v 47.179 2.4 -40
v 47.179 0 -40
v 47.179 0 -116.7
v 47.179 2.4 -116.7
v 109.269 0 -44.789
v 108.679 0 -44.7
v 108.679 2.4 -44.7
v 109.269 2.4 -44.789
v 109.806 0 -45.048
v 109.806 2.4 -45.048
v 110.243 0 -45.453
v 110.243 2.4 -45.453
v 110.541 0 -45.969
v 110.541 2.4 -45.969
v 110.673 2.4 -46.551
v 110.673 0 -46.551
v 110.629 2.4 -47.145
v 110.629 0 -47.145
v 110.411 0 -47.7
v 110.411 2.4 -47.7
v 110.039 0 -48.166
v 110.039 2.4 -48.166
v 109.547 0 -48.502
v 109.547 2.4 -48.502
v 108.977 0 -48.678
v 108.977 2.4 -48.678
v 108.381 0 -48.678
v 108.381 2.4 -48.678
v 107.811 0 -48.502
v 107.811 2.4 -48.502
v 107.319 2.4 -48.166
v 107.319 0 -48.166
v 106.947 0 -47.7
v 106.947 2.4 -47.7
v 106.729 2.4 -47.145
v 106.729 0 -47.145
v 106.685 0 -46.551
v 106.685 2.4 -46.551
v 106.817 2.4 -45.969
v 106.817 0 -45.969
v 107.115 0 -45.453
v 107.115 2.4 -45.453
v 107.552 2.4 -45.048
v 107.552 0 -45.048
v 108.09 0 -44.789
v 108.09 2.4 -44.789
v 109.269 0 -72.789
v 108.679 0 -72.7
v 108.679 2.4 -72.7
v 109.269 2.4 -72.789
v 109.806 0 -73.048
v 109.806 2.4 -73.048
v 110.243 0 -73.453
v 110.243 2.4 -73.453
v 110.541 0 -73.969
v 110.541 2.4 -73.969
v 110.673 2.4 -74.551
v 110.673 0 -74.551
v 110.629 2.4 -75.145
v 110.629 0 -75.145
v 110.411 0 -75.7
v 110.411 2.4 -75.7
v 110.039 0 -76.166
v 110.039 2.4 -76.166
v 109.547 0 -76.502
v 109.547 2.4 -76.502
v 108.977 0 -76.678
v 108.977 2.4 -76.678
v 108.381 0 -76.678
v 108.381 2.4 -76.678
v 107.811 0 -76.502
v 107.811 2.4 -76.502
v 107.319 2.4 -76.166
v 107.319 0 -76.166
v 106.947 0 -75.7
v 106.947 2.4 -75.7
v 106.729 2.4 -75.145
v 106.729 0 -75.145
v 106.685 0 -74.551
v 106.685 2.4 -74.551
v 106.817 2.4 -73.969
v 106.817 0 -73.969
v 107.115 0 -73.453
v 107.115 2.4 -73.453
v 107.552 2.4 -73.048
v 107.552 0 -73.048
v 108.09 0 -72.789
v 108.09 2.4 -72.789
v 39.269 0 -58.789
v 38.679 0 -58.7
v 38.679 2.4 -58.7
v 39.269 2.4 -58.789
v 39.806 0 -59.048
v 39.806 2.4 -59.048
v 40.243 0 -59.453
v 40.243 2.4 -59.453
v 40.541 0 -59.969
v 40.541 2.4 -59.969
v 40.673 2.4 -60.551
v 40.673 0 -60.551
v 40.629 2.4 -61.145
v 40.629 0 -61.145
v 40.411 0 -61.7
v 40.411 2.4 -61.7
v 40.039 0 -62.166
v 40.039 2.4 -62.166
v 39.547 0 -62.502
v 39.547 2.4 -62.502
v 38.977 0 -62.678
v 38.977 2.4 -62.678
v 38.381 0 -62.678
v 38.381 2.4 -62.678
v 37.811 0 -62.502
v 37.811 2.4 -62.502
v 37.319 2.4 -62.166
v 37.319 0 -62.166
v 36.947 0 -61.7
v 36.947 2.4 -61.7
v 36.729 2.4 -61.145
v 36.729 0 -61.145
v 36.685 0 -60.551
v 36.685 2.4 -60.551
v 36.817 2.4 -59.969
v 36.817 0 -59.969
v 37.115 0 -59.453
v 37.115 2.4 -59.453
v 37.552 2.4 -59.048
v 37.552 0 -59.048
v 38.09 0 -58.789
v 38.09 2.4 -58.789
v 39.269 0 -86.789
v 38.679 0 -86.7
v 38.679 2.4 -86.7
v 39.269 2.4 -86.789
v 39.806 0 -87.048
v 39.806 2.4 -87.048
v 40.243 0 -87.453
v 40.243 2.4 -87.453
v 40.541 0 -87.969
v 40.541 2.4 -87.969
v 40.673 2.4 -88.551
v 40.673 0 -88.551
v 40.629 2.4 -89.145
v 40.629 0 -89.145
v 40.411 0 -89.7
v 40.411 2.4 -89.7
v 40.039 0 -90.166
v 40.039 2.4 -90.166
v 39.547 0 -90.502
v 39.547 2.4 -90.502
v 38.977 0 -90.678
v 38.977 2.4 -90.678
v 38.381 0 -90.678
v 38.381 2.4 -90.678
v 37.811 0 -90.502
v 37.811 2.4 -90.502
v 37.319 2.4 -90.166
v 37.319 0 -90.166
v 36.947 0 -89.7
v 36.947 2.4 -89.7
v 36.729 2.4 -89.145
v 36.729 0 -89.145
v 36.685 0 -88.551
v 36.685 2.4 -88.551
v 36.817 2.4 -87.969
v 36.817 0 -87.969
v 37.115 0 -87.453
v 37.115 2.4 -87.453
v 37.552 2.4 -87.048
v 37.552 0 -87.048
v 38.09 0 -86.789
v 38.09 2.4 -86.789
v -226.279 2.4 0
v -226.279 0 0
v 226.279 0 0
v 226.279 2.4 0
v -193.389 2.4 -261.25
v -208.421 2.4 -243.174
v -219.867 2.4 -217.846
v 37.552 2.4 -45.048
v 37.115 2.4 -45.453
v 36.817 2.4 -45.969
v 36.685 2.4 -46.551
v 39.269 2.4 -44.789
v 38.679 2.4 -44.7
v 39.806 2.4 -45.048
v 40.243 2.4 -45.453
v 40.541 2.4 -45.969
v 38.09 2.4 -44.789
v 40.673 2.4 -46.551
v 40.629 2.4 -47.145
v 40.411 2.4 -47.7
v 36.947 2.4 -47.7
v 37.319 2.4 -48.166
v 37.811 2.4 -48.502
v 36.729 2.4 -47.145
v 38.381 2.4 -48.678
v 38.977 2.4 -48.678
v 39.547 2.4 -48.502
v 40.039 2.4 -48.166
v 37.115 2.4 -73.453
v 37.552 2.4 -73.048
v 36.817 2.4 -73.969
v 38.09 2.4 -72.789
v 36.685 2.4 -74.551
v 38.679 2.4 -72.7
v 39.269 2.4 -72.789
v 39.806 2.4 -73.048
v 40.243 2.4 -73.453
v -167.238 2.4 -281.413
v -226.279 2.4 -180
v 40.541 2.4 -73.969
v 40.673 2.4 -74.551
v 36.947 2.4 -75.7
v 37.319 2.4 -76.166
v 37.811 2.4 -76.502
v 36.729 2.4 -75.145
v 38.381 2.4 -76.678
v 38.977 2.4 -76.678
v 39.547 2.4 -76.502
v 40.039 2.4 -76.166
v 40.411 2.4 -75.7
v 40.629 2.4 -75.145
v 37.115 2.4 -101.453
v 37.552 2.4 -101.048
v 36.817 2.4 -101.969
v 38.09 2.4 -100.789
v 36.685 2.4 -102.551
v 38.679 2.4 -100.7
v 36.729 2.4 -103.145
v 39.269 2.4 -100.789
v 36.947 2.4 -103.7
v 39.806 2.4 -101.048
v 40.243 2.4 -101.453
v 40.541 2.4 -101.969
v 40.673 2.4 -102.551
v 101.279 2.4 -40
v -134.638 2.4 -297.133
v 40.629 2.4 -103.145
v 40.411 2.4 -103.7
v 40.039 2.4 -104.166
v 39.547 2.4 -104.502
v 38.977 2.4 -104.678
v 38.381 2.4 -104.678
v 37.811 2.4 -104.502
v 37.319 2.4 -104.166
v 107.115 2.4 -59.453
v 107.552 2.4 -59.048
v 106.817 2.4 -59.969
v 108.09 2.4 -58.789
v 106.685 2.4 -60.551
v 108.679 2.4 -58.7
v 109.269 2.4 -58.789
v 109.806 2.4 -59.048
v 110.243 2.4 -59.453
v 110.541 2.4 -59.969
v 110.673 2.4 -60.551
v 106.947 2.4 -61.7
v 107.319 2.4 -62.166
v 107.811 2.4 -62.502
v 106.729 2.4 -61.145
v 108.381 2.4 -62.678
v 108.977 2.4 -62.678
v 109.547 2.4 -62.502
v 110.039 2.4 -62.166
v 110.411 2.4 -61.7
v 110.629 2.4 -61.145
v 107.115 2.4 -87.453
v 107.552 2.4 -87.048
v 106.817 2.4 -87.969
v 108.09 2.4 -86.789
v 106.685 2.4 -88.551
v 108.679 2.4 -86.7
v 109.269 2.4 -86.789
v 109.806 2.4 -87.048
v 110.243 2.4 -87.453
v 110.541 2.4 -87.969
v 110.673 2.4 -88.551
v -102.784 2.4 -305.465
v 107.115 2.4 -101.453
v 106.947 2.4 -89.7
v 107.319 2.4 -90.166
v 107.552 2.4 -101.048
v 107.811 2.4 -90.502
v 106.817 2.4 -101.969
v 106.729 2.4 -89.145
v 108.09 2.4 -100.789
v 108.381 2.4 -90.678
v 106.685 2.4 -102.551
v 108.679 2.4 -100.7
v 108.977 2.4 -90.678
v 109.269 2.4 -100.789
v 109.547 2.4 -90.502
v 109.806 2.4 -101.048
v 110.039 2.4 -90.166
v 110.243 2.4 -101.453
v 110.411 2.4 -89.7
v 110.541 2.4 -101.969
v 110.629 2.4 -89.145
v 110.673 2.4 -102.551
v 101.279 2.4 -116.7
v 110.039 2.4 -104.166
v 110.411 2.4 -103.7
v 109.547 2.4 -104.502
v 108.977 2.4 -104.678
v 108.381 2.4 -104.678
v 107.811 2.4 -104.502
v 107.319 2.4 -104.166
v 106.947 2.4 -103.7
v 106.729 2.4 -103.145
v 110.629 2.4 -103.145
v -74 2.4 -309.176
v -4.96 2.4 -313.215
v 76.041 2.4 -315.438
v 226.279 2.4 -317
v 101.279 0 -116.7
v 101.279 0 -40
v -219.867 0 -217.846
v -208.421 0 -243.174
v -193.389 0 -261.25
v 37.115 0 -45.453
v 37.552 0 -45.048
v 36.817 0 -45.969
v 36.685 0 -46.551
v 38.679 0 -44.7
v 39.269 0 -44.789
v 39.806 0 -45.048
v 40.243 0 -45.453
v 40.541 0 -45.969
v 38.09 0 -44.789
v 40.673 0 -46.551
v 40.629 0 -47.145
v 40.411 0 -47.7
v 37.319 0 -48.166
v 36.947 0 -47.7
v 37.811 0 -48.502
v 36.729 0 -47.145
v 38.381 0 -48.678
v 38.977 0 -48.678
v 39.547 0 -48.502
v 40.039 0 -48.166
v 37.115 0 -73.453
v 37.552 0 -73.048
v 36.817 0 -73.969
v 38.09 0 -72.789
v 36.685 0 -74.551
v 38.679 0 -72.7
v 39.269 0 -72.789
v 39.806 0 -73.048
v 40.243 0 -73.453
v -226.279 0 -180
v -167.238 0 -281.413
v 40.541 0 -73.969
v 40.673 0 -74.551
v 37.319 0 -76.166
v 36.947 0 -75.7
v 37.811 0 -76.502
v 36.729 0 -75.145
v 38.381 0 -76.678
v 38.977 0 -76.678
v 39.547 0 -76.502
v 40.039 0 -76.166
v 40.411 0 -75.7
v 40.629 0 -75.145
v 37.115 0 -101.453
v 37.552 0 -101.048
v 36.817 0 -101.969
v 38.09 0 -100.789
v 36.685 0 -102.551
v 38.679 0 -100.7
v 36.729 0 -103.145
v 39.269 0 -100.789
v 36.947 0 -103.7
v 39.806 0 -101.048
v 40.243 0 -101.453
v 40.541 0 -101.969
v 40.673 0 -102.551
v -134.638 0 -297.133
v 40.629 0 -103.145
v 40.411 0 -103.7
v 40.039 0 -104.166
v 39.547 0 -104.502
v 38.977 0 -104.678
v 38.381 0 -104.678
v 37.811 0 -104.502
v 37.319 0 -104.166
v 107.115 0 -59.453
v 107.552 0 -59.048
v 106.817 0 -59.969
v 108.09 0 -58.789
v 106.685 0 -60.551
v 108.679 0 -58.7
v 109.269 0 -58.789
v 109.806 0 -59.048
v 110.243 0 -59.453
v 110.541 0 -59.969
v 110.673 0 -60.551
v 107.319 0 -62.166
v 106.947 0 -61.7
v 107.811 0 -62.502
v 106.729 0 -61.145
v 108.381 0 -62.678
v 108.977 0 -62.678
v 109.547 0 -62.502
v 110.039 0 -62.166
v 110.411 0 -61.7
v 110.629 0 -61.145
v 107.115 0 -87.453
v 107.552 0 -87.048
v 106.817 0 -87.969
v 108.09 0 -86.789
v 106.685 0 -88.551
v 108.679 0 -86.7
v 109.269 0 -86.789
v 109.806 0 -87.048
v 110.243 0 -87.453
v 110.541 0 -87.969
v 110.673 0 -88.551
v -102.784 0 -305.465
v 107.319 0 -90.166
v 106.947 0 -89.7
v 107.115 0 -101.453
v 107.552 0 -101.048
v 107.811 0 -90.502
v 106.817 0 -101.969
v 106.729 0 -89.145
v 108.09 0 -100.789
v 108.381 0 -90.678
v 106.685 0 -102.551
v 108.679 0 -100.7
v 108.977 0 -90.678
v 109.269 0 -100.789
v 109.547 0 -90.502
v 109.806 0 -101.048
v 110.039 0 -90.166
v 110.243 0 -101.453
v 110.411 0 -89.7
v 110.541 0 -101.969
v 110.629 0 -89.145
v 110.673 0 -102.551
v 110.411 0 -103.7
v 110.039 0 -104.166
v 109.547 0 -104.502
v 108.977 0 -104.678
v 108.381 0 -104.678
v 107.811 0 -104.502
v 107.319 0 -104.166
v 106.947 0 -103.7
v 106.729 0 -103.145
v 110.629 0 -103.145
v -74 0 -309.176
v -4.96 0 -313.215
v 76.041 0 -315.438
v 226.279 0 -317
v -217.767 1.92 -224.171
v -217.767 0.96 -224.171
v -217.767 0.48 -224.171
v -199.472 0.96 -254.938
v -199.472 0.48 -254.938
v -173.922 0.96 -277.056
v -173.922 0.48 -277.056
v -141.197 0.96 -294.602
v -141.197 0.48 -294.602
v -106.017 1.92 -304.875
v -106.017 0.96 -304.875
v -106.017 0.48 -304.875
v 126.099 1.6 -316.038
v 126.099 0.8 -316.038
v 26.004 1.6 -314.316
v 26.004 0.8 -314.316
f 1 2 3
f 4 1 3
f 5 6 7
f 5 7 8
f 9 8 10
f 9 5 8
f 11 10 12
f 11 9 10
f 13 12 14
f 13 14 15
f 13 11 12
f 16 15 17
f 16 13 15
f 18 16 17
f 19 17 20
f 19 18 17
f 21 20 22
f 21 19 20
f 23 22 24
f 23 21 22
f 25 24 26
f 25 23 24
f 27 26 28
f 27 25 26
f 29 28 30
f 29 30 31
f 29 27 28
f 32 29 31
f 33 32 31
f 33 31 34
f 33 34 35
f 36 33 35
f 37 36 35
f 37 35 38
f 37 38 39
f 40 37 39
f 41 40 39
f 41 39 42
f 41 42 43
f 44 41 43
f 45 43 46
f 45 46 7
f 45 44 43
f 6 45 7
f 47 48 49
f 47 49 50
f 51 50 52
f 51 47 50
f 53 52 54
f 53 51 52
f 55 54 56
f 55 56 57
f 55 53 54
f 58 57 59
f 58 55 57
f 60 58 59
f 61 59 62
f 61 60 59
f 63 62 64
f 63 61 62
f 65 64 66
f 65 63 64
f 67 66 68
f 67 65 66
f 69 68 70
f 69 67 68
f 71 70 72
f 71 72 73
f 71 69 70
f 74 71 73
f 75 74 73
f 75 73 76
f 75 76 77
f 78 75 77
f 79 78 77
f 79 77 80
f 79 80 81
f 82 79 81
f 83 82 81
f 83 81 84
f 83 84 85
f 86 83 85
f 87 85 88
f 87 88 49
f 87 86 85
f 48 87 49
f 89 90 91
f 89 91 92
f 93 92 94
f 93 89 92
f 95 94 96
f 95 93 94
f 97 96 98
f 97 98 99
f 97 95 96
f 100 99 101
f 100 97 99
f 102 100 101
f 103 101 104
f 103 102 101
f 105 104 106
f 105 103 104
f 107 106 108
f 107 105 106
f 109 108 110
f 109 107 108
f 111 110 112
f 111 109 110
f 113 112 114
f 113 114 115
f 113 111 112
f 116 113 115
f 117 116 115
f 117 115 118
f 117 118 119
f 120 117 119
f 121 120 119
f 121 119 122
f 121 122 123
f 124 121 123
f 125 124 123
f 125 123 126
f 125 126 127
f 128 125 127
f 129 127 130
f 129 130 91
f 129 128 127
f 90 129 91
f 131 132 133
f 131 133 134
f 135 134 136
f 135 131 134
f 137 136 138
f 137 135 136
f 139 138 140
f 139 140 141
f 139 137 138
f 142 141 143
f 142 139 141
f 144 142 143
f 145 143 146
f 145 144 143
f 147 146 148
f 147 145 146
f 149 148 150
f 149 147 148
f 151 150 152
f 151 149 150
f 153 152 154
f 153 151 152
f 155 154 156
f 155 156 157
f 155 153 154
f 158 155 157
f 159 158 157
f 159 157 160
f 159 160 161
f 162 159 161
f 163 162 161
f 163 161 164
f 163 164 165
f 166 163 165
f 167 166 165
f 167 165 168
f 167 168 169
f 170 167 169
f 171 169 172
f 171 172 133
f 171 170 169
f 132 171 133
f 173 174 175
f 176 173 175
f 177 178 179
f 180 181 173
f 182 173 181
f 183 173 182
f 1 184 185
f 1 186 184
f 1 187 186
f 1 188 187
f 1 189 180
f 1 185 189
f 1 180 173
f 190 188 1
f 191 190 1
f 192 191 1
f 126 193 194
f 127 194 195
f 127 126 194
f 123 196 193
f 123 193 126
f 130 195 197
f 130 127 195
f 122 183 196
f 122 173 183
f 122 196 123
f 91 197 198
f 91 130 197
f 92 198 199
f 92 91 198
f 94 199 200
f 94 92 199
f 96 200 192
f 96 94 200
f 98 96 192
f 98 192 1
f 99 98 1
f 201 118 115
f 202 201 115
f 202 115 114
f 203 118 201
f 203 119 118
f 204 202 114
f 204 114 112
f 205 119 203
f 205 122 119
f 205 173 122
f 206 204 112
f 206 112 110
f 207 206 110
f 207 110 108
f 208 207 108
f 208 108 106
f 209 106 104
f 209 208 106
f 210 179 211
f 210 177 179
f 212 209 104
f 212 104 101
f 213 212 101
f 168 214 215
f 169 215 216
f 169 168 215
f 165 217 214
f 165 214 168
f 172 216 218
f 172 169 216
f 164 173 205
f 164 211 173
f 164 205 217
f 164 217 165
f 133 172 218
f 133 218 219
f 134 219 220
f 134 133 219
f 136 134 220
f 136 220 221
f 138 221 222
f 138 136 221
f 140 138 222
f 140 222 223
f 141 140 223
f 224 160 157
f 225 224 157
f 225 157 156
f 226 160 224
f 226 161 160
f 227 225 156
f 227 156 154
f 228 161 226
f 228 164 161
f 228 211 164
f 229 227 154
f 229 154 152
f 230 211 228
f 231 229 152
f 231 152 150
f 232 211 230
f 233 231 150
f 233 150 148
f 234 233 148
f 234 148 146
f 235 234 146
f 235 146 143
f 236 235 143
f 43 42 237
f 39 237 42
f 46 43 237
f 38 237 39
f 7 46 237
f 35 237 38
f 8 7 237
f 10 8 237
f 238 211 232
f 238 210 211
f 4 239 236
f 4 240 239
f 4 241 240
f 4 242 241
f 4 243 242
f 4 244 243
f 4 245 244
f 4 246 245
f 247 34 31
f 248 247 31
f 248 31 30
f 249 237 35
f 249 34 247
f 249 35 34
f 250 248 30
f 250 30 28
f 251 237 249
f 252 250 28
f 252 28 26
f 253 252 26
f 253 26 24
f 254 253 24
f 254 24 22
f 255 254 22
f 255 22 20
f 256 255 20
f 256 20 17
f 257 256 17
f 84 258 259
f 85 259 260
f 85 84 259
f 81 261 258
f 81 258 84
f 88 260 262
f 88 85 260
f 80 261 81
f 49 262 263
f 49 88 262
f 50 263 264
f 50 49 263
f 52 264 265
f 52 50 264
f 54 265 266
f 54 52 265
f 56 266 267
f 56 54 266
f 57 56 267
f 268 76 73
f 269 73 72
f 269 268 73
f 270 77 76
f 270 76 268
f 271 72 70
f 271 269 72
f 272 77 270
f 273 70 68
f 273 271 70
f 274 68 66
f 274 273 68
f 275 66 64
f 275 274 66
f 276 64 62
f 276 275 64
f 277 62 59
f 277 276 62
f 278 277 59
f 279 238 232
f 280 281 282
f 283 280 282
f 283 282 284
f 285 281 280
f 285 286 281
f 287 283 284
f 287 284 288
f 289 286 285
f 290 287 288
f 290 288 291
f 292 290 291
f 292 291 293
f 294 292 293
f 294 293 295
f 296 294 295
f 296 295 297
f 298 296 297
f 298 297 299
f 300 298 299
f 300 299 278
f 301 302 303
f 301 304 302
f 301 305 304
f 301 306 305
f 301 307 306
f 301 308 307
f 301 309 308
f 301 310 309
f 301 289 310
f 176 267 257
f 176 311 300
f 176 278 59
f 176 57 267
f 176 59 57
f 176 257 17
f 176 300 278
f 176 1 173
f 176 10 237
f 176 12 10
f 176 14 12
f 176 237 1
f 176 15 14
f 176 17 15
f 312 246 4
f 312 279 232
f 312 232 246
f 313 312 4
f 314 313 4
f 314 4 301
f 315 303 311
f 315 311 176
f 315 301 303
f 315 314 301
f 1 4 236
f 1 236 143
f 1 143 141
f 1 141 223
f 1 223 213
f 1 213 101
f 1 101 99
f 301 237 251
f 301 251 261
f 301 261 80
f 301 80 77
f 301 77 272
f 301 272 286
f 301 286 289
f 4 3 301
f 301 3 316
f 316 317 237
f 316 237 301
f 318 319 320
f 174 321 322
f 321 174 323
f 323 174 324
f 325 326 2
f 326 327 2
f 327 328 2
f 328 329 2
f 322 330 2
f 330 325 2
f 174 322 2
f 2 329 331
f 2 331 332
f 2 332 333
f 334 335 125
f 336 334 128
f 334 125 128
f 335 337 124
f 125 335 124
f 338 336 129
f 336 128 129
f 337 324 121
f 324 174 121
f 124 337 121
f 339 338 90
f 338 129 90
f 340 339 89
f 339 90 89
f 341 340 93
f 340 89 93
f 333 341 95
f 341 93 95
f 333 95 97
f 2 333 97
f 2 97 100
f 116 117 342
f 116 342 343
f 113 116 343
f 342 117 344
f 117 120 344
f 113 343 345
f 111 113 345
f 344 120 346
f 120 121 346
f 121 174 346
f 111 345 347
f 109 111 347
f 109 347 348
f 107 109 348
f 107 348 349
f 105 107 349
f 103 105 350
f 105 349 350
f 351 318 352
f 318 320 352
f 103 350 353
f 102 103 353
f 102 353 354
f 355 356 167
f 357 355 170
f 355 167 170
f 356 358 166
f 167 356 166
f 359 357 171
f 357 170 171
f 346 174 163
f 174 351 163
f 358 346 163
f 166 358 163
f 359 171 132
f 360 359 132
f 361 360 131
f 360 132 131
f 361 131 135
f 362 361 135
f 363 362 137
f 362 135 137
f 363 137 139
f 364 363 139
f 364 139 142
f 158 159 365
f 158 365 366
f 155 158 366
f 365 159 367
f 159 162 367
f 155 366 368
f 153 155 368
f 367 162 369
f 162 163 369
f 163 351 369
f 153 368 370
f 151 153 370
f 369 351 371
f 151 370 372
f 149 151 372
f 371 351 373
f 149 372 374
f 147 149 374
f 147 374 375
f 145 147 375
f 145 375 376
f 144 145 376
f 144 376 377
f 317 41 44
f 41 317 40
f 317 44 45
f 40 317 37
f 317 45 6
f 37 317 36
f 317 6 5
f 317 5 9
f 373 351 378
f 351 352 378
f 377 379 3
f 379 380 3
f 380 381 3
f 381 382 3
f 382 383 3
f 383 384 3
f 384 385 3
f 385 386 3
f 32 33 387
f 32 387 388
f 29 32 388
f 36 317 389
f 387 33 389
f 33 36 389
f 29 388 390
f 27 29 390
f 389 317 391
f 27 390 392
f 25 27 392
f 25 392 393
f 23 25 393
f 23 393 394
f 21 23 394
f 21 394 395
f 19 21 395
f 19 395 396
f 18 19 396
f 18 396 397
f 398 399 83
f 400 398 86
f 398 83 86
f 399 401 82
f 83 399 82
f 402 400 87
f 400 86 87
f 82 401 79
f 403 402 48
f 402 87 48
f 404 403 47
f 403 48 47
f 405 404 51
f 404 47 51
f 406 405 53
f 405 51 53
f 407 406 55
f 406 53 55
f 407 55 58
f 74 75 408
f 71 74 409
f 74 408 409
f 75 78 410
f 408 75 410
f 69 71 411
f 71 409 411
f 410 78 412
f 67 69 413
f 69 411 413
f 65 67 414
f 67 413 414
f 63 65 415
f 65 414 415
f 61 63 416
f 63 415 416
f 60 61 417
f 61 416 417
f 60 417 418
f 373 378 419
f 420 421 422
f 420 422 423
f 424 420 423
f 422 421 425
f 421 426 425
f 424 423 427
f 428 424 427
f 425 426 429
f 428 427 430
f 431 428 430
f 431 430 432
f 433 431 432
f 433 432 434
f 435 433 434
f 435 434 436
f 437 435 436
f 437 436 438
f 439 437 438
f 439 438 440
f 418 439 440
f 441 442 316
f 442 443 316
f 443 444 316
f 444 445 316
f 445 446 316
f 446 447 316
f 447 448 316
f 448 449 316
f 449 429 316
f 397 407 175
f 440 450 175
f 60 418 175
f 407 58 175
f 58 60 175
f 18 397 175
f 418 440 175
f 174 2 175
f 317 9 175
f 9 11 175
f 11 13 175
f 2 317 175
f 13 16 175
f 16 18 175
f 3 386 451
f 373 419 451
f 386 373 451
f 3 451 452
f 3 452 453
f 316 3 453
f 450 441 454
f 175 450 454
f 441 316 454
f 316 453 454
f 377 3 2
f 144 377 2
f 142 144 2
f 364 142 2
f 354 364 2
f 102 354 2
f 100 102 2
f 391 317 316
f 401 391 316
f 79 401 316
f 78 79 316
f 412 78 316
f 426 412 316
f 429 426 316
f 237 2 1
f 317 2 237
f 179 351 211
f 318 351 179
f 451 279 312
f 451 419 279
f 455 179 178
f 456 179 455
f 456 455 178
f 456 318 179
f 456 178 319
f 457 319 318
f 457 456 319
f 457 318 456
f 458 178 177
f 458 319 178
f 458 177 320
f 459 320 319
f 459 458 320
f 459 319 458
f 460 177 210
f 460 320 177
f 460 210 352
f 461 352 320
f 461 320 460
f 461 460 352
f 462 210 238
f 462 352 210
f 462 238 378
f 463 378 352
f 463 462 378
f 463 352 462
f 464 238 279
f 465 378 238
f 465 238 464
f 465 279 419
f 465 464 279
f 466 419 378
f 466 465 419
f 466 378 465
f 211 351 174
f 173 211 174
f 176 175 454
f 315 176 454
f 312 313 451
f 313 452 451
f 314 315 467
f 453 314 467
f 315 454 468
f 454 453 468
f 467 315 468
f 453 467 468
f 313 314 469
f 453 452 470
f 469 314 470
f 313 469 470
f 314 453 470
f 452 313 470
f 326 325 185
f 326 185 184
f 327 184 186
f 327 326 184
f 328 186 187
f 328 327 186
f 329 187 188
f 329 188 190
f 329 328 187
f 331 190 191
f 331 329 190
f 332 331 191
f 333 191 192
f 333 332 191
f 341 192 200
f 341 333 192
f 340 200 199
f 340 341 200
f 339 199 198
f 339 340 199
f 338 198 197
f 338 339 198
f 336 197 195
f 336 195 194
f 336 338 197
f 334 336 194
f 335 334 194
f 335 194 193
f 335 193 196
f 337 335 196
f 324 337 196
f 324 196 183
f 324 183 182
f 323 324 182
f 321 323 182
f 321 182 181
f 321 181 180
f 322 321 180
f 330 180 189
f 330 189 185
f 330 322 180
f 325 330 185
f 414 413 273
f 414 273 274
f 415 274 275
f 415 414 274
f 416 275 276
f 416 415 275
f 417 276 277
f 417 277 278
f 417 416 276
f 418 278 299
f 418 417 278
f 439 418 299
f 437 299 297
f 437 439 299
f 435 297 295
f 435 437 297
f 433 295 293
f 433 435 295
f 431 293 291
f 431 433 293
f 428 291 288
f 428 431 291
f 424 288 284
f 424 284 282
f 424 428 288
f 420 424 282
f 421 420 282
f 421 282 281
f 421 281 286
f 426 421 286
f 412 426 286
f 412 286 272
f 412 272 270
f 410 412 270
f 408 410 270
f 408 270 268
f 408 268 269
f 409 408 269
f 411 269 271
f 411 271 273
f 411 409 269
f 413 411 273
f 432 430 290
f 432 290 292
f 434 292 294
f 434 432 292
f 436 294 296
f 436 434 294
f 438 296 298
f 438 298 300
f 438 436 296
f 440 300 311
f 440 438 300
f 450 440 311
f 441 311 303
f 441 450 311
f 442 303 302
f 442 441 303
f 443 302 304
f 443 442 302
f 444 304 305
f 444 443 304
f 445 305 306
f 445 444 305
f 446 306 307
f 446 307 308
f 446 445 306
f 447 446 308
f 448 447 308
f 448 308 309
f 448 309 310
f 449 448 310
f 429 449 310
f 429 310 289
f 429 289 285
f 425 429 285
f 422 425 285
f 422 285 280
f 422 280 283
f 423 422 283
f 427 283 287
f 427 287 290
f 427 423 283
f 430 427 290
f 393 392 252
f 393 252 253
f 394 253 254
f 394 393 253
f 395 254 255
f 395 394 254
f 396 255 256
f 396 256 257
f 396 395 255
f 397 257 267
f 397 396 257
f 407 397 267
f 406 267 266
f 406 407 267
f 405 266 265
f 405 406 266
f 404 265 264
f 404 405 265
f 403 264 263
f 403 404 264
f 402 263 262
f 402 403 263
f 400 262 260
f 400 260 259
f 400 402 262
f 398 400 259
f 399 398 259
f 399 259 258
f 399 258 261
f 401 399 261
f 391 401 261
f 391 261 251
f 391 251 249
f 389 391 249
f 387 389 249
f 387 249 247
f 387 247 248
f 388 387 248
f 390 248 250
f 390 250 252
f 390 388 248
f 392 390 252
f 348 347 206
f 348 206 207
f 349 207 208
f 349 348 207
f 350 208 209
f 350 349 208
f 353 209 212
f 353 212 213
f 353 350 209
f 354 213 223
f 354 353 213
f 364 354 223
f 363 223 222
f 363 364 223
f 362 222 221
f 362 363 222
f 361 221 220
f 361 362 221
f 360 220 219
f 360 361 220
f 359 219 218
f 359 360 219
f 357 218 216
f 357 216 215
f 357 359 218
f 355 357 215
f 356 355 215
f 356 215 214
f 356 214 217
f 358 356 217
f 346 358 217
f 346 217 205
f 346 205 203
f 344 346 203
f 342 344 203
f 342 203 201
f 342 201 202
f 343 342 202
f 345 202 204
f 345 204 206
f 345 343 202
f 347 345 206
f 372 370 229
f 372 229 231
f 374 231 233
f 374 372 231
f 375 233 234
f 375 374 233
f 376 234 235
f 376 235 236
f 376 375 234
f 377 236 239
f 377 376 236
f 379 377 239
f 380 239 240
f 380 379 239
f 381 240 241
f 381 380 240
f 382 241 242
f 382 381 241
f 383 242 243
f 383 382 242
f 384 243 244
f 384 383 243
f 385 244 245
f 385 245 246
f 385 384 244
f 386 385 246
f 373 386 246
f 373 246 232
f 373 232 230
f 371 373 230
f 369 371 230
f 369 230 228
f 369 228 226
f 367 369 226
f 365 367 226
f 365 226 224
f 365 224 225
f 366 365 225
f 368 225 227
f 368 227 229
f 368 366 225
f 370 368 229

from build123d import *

# Parameters (mm, degrees)
CROQUIS1_R              = 2
CROQUIS1_W              = 54.1
CROQUIS1_H              = 76.7
SALIENTE_EXTRUIR1_DEPTH = 2.4


with BuildPart() as part:
    # Croquis1 → Saliente-Extruir1 (new body)
    with BuildSketch(Plane(origin=(0, 0, 0), x_dir=(1, 0, 0), z_dir=(0, 1, 0))):
        with BuildLine():
            Line((-226.279027723, 0), (226.279027723, 0))
            Line((226.279027723, 0), (226.279027723, 317))
            add(Edge.make_bspline(
                [(226.279027723, 317), (126.058596011, 315.530489859), (25.957083457, 316.912644391), (-74, 309.175657787)],
                knots=[0, 0, 0, 0, 1, 1, 1, 1], degree=3))
            add(Edge.make_bspline(
                [(-226.279027723, 180), (-223.667205932, 215.476583649), (-213.411911356, 241.728935898), (-180.591001989, 273.897889753), (-156.350341436, 289.269961958), (-113.067752708, 305.04715057), (-89.421541744, 307.637409523), (-74, 309.175657787)],
                knots=[0, 0, 0, 0, 0.358064893, 0.430060637, 0.687746689, 0.747961701, 1, 1, 1, 1], degree=3))
            Line((-226.279027723, 180), (-226.279027723, 0))
        make_face()
        with Locations(Location((38.679027723, 102.7, 0), (0, 0, 270))):
            Circle(CROQUIS1_R, mode=Mode.SUBTRACT)
        with Locations(Location((108.679027723, 102.7, 0), (0, 0, 270))):
            Circle(CROQUIS1_R, mode=Mode.SUBTRACT)
        with Locations(Location((108.679027723, 88.7, 0), (0, 0, 270))):
            Circle(CROQUIS1_R, mode=Mode.SUBTRACT)
        with Locations(Location((108.679027723, 74.7, 0), (0, 0, 270))):
            Circle(CROQUIS1_R, mode=Mode.SUBTRACT)
        with Locations(Location((108.679027723, 60.7, 0), (0, 0, 270))):
            Circle(CROQUIS1_R, mode=Mode.SUBTRACT)
        with Locations(Location((108.679027723, 46.7, 0), (0, 0, 270))):
            Circle(CROQUIS1_R, mode=Mode.SUBTRACT)
        with Locations(Location((38.679027723, 88.7, 0), (0, 0, 270))):
            Circle(CROQUIS1_R, mode=Mode.SUBTRACT)
        with Locations(Location((38.679027723, 74.7, 0), (0, 0, 270))):
            Circle(CROQUIS1_R, mode=Mode.SUBTRACT)
        with Locations(Location((38.679027723, 60.7, 0), (0, 0, 270))):
            Circle(CROQUIS1_R, mode=Mode.SUBTRACT)
        with Locations(Location((38.679027723, 46.7, 0), (0, 0, 270))):
            Circle(CROQUIS1_R, mode=Mode.SUBTRACT)
        with Locations((74.229027723, 78.35)):
            Rectangle(CROQUIS1_W, CROQUIS1_H, mode=Mode.SUBTRACT)
    extrude(amount=SALIENTE_EXTRUIR1_DEPTH)


solid = part.part
